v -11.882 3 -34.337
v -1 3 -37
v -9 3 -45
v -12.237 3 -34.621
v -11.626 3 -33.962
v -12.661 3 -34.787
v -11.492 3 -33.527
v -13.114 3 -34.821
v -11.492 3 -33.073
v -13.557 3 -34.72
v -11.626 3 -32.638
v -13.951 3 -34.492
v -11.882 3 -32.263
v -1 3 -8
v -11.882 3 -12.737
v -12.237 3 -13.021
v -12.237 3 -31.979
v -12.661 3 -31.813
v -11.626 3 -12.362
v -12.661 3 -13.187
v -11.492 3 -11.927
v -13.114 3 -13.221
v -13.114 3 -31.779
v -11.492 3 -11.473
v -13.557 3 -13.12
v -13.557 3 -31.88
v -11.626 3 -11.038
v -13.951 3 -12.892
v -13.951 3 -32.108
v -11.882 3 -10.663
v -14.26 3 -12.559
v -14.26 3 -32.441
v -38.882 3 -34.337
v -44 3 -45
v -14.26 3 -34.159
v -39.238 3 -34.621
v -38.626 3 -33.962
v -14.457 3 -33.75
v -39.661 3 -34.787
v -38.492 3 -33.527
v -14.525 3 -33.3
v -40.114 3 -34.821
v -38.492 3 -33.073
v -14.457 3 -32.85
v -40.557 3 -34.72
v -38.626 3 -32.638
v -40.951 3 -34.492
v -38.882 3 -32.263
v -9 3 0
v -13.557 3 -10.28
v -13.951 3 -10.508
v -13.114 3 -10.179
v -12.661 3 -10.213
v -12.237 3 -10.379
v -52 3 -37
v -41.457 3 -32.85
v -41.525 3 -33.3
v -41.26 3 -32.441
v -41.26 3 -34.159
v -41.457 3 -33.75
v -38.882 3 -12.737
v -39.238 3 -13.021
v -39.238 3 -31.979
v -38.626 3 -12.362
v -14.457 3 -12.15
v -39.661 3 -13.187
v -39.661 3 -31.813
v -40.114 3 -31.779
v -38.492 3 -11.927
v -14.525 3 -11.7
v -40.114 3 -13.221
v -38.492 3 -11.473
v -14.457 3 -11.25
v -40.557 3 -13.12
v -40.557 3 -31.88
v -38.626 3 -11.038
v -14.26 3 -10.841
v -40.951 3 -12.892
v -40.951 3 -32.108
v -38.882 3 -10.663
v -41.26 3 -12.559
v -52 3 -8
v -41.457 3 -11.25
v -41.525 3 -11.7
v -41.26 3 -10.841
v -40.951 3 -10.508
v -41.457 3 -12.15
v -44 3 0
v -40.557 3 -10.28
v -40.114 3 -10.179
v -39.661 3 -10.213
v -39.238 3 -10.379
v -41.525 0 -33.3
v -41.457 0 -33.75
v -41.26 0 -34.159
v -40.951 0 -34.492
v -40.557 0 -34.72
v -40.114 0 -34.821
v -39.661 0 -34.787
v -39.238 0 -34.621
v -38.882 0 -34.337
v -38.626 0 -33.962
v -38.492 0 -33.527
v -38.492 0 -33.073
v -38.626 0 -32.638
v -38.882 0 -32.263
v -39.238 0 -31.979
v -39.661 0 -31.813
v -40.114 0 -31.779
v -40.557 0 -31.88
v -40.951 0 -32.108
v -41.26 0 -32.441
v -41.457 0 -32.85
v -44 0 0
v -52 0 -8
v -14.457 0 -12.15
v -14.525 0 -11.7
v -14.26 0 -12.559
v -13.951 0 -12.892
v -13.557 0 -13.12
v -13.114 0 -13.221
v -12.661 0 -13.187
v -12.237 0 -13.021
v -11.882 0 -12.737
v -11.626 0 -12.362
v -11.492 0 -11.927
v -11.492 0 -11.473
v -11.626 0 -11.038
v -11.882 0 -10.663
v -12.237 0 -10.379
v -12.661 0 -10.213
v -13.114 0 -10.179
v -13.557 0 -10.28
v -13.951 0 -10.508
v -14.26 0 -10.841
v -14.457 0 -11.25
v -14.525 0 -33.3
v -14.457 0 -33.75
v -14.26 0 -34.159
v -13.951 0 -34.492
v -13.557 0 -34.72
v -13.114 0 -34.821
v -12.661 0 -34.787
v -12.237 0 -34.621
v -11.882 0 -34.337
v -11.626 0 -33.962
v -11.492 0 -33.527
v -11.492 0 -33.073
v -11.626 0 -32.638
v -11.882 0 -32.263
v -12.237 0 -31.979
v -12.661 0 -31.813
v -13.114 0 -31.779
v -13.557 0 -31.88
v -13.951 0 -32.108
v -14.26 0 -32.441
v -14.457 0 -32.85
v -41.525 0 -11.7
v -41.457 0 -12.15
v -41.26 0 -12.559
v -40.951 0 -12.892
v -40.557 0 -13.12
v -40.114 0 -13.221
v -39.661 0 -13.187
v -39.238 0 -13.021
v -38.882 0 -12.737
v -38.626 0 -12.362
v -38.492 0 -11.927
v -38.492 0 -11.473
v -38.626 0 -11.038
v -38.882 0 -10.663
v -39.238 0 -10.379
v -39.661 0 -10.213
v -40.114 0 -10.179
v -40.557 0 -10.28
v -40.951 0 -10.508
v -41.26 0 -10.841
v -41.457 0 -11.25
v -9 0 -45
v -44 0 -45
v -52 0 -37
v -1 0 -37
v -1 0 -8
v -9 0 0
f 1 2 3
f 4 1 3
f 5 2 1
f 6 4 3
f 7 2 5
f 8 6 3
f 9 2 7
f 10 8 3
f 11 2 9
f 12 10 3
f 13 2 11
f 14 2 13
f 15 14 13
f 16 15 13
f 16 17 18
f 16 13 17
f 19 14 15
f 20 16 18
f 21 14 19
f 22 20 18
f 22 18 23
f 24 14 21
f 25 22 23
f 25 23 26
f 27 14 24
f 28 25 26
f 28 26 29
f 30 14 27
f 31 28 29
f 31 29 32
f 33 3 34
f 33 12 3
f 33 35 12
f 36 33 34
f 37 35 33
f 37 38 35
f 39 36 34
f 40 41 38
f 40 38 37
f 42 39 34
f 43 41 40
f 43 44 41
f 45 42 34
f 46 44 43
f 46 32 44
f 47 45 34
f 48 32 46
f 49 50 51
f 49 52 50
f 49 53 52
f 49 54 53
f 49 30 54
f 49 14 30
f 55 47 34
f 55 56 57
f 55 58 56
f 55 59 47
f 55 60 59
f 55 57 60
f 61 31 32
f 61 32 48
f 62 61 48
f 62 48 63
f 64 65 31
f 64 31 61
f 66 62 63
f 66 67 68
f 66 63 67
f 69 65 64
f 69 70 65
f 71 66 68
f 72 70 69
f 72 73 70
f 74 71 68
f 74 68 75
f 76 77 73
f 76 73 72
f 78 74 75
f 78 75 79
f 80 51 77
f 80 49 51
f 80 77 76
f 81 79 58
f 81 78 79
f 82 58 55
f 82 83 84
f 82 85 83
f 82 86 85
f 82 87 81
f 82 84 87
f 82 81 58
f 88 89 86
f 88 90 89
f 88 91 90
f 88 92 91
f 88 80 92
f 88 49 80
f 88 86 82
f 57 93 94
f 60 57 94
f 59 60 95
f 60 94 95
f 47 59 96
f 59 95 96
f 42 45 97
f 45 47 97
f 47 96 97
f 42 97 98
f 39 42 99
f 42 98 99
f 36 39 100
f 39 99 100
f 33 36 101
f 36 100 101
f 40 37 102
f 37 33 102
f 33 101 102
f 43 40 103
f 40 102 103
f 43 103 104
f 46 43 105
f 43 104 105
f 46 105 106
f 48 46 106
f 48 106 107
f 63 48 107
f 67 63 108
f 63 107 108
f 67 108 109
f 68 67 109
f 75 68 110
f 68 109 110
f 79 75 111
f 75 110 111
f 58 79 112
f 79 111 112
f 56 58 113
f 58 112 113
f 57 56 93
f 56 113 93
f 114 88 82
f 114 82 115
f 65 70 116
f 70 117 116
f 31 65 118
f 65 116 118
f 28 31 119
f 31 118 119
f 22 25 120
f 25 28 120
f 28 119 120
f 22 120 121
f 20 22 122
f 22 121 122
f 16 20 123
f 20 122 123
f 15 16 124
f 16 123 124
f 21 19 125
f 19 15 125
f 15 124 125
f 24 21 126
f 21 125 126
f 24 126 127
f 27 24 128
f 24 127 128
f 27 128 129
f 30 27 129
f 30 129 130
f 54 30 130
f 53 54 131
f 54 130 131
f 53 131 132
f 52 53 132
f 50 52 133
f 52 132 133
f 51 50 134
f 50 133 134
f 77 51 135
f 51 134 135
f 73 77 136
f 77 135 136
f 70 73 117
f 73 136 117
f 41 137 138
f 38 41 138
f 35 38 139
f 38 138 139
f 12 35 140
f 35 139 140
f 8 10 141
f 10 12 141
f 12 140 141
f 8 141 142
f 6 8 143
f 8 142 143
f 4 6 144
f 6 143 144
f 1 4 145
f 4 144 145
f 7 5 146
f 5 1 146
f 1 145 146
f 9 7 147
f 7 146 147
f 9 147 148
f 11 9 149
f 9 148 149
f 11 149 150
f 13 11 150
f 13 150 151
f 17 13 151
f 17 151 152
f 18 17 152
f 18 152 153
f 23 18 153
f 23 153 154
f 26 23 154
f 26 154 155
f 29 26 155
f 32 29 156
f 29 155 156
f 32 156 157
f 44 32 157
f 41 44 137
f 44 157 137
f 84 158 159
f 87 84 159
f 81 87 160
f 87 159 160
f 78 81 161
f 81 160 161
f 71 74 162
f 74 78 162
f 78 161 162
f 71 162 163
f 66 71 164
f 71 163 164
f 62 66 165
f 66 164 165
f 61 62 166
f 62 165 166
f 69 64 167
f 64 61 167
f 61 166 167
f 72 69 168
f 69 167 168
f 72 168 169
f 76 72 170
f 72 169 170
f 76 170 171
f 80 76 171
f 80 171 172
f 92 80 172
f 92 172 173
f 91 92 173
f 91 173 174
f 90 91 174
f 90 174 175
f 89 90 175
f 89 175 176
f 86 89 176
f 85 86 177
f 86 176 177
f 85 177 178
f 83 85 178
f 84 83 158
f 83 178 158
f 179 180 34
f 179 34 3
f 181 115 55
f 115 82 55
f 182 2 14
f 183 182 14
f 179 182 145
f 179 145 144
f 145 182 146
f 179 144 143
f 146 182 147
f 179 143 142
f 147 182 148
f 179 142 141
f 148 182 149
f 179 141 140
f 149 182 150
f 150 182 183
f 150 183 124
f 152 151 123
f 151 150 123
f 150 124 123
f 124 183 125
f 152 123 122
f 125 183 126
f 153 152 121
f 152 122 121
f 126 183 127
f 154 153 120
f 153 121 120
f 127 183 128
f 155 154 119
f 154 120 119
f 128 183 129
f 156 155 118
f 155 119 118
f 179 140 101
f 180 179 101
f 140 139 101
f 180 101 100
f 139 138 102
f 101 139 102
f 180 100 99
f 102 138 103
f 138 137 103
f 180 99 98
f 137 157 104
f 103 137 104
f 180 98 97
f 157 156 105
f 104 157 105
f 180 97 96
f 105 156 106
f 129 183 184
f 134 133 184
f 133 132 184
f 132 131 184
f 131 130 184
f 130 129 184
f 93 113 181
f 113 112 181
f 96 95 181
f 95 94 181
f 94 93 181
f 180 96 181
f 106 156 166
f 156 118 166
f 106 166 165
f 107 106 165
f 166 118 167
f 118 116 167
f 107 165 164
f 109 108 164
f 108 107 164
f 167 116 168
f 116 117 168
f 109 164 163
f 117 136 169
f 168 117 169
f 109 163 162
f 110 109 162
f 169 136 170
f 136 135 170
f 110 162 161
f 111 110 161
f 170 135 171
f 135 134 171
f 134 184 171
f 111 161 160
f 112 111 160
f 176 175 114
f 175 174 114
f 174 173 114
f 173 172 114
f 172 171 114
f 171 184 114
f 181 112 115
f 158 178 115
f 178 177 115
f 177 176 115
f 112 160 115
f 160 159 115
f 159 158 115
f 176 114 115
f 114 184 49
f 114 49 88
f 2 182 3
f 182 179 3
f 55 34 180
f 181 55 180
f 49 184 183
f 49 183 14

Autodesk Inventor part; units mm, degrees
ref_plane "YZ Plane" through (0, 0, 0) normal (1, 0, 0) x (0, 1, 0)
ref_plane "XZ Plane" through (0, 0, 0) normal (0, 1, 0) x (-1, 0, 0)
ref_plane "XY Plane" through (0, 0, 0) normal (0, 0, 1) x (1, 0, 0)
sketch "草图1" plane through (0, 0, 0) normal (0, 1, 0) x (-1, 0, 0)
  line L0 (0, 0) -> (53, 0)
  line L1 (53, 0) -> (53, -45)
  line L2 (53, -45) -> (0, -45)
  line L3 (0, -45) -> (0, 0)
  line L4 (53, -22.5) -> (49.1677, -22.5)
  line L5 (26.5, -45) -> (26.5, -38.7473)
  circle A0 centre (40, -33.3) radius 1.525
  circle A1 centre (40, -11.7) radius 1.525
  circle A2 centre (13, -33.3) radius 1.525
  circle A3 centre (13, -11.7) radius 1.525
  dimension "d0" = 45
  dimension "d1" = 53
  dimension "d2" = 10.8
  dimension "d3" = 13
  dimension "d4" = 3.05
extrude "拉伸1" add sketch "草图1" along normal blind 3
sketch "草图2" plane through (0, 3, 0) normal (0, 1, 0) x (1, 0, 0)
  line L0 (-52, 50.7806) -> (-1, 50.7806)
  line L1 (-1, 50.7806) -> (-1, -16.6208)
  line L2 (-1, -16.6208) -> (-52, -16.6208)
  line L3 (-52, -16.6208) -> (-52, 50.7806)
  line L4 (-53, 45) -> (-53, 0) projected
  line L5 (0, 0) -> (0, 45) projected
  line L6 (0, 0) -> (0, 45) projected
  line L7 (0, 45) -> (-53, 45) projected
  line L8 (-53, 45) -> (-53, 0) projected
  line L9 (-53, 0) -> (0, 0) projected
  circle A0 centre (-40, 33.3) radius 1.525 projected
  circle A1 centre (-40, 11.7) radius 1.525 projected
  circle A2 centre (-13, 33.3) radius 1.525 projected
  circle A3 centre (-13, 11.7) radius 1.525 projected
  point P0 (-1, 0)
  point P1 (-1, 45)
  point P2 (-52, 0)
  point P3 (-52, 45)
  dimension "d10" = 1
  dimension "d11" = 1
extrude "拉伸2" cut sketch "草图2" against normal blind 10 contours L3 L9 L4 L7 | L7 L5 L9 L1
chamfer "倒角2" distance 8 angle 45 4 edges at (-1, 1.5, 0) (-52, 1.5, 0) (-52, 1.5, -45) (-1, 1.5, -45)
sketch "草图3" plane through (0, 0, 0) normal (0, -1, 0) x (1, 0, 0)
  circle A0 centre (-40, -33.3) radius 1.525 projected
  circle A1 centre (-13, -33.3) radius 1.525 projected
  point P0 (0, 0)
  dimension "d17" = 27
properties part number "sh2"
